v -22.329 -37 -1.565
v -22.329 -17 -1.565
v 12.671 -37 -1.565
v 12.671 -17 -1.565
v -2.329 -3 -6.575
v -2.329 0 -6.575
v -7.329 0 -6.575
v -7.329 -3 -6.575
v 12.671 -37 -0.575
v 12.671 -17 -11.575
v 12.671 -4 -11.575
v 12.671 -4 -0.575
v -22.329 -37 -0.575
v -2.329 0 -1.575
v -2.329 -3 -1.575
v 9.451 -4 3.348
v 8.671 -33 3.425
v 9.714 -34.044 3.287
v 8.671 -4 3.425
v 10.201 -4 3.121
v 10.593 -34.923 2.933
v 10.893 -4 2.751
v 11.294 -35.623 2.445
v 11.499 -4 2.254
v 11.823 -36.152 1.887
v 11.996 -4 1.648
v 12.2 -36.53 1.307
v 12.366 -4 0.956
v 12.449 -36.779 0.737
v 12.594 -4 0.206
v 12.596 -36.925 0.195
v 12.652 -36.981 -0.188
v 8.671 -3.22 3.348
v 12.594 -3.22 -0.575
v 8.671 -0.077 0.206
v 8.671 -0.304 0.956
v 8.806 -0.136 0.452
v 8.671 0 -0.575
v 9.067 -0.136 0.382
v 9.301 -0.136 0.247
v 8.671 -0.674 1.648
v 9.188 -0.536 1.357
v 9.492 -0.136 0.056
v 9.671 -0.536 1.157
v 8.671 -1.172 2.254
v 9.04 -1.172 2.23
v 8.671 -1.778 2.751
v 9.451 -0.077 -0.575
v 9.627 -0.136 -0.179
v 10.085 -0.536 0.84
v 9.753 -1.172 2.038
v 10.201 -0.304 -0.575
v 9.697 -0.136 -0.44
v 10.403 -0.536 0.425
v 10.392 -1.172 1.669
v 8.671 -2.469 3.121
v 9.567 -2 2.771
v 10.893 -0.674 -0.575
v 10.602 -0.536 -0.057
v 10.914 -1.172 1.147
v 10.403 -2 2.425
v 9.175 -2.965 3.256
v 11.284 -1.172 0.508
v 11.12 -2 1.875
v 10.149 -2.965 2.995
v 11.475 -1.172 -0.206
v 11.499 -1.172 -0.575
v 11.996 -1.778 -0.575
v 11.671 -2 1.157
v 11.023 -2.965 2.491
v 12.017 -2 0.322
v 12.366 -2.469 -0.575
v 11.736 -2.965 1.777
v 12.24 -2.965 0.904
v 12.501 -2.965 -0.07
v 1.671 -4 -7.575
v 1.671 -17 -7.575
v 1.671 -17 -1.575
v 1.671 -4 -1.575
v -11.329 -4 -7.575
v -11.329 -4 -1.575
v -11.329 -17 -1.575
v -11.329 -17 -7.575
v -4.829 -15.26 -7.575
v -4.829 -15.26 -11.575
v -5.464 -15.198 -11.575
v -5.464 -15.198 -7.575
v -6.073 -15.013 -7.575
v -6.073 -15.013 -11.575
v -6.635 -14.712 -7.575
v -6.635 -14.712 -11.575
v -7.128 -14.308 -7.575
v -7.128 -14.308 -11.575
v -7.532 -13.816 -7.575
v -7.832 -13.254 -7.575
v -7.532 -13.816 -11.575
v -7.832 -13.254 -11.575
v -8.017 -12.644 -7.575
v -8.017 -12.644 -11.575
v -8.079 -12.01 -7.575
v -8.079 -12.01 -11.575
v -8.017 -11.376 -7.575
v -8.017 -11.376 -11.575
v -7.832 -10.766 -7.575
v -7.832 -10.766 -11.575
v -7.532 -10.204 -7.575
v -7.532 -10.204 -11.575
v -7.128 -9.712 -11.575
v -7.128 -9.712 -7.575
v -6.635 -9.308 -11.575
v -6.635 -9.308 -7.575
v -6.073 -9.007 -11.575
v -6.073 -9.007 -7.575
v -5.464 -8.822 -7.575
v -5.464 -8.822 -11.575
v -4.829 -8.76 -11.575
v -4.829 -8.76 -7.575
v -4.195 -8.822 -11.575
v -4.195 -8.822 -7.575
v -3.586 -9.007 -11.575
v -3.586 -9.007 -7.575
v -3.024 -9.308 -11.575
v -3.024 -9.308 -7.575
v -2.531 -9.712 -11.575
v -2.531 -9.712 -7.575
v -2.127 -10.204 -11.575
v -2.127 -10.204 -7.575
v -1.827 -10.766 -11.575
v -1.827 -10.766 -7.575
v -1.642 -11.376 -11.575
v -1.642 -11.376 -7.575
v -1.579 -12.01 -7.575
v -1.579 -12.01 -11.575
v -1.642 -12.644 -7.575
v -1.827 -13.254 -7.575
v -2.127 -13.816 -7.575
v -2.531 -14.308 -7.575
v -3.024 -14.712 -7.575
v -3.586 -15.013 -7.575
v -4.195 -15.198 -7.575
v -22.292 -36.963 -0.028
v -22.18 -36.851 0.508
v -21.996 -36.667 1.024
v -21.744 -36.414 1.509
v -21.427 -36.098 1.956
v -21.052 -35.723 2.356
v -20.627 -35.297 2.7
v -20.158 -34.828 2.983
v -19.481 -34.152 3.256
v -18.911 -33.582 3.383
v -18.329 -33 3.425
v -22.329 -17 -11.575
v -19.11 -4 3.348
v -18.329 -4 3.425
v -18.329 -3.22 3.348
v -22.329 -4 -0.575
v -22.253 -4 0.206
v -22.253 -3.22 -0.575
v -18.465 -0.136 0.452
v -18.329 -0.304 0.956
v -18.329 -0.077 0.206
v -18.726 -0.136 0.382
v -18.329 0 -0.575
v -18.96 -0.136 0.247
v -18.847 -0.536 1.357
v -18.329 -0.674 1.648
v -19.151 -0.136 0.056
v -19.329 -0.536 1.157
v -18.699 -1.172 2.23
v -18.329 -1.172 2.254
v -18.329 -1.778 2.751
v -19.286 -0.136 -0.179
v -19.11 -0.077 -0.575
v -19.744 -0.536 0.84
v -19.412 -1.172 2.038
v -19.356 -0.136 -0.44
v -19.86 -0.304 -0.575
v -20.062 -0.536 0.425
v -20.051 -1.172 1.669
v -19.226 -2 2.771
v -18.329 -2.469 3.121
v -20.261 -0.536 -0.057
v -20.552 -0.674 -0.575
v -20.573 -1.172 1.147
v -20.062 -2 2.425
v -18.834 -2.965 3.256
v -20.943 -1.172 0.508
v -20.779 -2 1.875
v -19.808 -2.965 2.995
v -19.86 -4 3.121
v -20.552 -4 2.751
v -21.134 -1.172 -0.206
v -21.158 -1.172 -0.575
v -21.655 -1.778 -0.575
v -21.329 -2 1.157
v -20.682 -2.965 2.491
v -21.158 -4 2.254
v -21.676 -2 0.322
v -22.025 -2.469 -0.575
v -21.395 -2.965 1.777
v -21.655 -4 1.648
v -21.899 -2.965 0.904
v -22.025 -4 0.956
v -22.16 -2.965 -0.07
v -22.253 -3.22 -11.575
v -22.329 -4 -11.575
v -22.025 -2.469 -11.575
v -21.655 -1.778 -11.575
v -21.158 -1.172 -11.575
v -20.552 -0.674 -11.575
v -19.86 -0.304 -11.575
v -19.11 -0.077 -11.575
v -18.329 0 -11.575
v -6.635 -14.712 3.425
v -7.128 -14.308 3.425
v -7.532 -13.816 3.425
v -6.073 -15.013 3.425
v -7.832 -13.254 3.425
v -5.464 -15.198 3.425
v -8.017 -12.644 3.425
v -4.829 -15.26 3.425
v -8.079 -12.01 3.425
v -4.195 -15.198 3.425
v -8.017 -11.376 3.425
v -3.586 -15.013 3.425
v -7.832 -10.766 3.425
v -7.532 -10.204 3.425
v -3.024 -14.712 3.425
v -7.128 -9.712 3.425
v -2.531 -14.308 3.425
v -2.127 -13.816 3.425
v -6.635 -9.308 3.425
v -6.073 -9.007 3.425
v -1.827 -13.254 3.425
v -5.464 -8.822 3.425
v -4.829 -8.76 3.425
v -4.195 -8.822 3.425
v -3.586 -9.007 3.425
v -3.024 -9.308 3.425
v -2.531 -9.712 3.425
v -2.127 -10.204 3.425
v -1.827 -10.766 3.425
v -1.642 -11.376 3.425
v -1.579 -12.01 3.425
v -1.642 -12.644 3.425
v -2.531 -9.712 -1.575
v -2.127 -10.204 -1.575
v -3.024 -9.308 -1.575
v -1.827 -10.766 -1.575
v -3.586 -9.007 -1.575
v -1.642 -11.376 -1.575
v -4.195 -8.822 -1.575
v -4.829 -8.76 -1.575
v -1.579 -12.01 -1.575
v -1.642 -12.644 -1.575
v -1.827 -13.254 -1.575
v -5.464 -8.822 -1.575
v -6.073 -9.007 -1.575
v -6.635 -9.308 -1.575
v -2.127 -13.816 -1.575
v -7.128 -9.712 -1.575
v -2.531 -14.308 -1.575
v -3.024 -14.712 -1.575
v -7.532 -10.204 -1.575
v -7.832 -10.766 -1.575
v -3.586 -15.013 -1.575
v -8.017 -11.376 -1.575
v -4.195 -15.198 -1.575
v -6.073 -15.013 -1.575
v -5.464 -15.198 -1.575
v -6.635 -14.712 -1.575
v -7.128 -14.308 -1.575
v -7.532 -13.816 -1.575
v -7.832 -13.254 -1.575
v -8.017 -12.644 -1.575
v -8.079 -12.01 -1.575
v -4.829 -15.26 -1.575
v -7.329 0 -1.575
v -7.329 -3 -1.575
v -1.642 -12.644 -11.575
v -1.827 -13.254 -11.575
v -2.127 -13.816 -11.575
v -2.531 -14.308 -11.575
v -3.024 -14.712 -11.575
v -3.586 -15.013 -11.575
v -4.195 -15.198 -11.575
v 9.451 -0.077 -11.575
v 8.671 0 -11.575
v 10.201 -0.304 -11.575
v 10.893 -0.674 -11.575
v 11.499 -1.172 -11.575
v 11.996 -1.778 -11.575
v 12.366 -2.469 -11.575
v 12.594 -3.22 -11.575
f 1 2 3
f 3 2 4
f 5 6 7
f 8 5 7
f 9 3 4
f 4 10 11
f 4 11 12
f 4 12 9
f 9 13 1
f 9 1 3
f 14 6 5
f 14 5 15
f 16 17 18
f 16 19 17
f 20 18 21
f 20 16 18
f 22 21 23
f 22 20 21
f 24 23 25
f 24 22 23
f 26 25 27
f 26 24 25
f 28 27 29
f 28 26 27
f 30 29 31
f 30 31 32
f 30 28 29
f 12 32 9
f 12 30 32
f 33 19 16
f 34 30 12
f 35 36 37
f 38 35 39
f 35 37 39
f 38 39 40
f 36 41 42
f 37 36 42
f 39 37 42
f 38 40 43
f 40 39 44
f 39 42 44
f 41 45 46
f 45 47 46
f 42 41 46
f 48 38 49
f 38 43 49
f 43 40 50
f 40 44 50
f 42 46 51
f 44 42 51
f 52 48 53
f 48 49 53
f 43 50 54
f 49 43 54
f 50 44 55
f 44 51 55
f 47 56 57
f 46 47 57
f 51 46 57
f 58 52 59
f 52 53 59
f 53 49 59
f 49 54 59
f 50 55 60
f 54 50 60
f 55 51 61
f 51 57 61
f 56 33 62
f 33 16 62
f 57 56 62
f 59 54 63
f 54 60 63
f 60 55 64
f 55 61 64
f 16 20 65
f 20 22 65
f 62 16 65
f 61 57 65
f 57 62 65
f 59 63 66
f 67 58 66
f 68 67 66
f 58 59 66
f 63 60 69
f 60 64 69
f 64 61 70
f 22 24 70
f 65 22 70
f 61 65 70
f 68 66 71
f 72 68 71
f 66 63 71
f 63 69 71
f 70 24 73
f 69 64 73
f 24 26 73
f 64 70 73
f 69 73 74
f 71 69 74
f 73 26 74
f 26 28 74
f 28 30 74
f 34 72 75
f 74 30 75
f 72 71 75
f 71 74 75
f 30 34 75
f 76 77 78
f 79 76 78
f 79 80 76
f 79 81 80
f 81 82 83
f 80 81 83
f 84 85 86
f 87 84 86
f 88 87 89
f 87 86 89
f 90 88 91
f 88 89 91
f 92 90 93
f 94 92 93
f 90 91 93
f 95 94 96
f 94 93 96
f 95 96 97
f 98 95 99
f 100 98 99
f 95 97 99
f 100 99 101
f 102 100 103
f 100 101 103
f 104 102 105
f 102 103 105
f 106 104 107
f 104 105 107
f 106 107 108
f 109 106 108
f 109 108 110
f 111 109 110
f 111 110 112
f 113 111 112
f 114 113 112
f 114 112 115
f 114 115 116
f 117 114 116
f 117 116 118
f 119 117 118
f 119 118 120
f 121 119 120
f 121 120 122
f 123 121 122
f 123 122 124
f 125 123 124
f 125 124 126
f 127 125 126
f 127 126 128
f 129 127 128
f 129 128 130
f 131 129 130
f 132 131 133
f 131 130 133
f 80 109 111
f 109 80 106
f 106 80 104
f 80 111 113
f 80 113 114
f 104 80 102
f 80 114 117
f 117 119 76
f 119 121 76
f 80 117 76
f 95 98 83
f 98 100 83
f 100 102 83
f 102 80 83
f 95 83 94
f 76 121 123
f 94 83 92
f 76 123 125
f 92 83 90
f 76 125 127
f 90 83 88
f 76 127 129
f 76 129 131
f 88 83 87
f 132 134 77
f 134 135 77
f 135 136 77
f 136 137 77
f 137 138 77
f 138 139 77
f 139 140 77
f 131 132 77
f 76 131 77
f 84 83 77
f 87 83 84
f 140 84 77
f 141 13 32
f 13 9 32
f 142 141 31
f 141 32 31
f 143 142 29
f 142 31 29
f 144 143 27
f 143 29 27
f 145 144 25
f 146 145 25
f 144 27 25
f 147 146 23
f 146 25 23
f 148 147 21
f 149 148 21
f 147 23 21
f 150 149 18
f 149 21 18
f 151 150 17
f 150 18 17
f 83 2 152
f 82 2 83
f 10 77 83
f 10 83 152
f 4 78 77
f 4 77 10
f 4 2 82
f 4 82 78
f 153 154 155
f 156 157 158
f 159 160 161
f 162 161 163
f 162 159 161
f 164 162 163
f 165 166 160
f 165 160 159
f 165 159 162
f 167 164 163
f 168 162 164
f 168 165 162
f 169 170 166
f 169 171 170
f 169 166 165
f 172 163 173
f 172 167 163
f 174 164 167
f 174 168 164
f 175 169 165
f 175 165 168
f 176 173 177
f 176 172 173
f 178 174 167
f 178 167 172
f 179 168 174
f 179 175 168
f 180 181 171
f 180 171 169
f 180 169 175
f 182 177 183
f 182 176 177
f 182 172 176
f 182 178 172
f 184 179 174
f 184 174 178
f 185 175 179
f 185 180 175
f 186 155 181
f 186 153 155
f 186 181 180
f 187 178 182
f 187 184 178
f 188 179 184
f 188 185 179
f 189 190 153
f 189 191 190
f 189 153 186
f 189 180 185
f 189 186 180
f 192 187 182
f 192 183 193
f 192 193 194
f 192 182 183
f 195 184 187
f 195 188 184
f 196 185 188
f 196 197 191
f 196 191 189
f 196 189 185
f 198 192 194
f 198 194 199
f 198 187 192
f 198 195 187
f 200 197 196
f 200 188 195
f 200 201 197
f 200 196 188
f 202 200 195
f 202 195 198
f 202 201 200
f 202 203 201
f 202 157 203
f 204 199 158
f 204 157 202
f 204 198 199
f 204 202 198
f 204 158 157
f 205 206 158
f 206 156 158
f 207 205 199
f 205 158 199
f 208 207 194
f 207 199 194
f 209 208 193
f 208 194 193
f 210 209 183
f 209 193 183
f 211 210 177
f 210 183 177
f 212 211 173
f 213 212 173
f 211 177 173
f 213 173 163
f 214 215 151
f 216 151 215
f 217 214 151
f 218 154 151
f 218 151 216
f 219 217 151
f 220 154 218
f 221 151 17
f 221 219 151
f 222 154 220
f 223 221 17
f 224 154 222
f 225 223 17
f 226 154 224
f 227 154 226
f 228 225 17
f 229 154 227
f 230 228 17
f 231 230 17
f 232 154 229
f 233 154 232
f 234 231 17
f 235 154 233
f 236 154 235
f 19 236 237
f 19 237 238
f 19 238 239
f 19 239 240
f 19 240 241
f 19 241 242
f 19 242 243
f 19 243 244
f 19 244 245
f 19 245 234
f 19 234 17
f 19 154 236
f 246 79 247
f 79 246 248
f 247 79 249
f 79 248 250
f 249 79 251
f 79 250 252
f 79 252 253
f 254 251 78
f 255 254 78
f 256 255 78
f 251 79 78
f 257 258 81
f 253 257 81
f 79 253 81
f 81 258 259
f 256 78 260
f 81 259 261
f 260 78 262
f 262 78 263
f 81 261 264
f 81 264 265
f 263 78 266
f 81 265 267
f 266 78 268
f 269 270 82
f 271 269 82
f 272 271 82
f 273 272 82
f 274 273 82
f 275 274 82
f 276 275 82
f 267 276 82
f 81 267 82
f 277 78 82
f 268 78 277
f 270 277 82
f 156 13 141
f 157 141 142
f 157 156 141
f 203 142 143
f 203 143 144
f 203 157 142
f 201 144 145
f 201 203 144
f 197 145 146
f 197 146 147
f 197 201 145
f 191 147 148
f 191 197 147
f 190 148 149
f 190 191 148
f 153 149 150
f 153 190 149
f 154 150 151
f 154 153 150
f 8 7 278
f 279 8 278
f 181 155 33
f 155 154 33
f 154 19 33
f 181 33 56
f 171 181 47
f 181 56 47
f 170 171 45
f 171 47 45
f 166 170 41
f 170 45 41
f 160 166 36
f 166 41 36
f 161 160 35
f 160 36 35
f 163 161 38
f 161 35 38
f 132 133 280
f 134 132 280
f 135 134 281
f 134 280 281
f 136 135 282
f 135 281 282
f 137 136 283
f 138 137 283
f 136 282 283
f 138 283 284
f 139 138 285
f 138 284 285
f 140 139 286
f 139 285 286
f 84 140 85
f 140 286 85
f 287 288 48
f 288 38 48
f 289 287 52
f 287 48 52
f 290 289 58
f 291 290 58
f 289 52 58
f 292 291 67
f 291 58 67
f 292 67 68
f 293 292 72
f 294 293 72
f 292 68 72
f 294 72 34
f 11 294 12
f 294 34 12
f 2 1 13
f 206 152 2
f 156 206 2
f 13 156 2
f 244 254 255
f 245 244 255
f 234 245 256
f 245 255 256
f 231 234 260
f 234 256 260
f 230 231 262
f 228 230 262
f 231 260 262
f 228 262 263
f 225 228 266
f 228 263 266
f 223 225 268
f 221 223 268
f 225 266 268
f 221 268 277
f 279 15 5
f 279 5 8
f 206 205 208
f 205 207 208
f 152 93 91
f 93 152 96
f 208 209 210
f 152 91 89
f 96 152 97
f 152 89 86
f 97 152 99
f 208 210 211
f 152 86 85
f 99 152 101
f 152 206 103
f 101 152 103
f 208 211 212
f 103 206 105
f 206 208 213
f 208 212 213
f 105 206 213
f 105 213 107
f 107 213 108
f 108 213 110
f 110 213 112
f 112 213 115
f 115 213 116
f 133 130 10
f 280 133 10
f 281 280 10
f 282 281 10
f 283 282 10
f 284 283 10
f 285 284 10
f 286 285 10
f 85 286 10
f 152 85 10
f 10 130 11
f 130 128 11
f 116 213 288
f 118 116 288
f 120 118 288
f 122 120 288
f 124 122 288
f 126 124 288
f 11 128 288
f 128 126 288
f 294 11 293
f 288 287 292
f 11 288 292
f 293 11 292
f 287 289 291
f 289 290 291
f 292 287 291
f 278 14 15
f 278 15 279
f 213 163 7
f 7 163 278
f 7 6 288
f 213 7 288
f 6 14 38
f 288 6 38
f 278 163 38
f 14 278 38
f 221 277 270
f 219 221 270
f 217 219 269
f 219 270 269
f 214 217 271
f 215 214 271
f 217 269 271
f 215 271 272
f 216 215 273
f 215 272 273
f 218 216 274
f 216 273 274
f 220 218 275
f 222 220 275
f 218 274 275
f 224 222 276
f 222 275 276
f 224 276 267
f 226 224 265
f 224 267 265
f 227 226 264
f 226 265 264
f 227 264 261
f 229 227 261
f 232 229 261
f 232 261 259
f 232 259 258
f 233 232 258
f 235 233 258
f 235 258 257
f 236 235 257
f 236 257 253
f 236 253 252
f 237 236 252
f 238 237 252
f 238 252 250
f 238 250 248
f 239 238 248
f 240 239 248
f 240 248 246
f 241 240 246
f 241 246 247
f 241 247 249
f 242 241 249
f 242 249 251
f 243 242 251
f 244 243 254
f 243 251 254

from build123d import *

# Parameters (mm, degrees)
F0_W     = 35
F0_H     = 15
F1_DEPTH = 17
F2_W     = 35
F2_H     = 4.99
F3_DEPTH = 20
F5_DEPTH = 13
F7_DEPTH = 25
F8_W     = 5
F8_H     = 5
F9_DEPTH = 3
F10_R    = 4


with BuildPart() as f1:
    # F0 (on Front) → F1 (new body)
    with BuildSketch(Plane.XZ):
        with Locations((-4.829492, -4.074684)):
            Rectangle(F0_W, F0_H)
    extrude(amount=F1_DEPTH)

    # F2 (on face) → F3 (join)
    with BuildSketch(Plane.XZ.offset(17)):
        with Locations((-4.829492, 0.930316)):
            Rectangle(F2_W, F2_H)
    extrude(amount=F3_DEPTH)

    # F4 (on face) → F5 (cut)
    with BuildSketch(Plane.XZ.offset(17)):
        Polygon((-11.329492, -7.574684), (-4.829492, -7.574684), (1.670508, -7.574684), (1.670508, -1.574684), (-11.329492, -1.574684), align=None)
    extrude(amount=-F5_DEPTH, mode=Mode.SUBTRACT)

    # F6 (on face) → F7 (cut)
    with BuildSketch(Plane(origin=(0, 0, -11.574684), x_dir=(1, 0, 0), z_dir=(0, 0, -1))):
        with BuildLine():
            ThreePointArc((-1.579492, 12.01), (-2.531395, 14.308097), (-4.829492, 15.26))
            ThreePointArc((-4.829492, 15.26), (-7.127589, 9.711903), (-1.579492, 12.01))
        make_face()
    extrude(amount=-F7_DEPTH, mode=Mode.SUBTRACT)

    # F8 (on face) → F9 (cut)
    with BuildSketch(Plane(origin=(0, 0, 0), x_dir=(-1, 0, 0), z_dir=(0, 1, 0))):
        with Locations((4.829492, -4.074684)):
            Rectangle(F8_W, F8_H)
    extrude(amount=-F9_DEPTH, mode=Mode.SUBTRACT)

    # F10
    f10_edges = [f1.edges().sort_by_distance(p)[0] for p in [
        (12.670508, -18.5, 3.425316),
        (-4.829492, -37, 3.425316),
        (-22.329492, -18.5, 3.425316),
        (-4.829492, 0, 3.425316),
        (-22.329492, 0, -4.074684),
        (12.670508, 0, -4.074684),
    ]]
    fillet(f10_edges, radius=F10_R)


solid = f1.part
